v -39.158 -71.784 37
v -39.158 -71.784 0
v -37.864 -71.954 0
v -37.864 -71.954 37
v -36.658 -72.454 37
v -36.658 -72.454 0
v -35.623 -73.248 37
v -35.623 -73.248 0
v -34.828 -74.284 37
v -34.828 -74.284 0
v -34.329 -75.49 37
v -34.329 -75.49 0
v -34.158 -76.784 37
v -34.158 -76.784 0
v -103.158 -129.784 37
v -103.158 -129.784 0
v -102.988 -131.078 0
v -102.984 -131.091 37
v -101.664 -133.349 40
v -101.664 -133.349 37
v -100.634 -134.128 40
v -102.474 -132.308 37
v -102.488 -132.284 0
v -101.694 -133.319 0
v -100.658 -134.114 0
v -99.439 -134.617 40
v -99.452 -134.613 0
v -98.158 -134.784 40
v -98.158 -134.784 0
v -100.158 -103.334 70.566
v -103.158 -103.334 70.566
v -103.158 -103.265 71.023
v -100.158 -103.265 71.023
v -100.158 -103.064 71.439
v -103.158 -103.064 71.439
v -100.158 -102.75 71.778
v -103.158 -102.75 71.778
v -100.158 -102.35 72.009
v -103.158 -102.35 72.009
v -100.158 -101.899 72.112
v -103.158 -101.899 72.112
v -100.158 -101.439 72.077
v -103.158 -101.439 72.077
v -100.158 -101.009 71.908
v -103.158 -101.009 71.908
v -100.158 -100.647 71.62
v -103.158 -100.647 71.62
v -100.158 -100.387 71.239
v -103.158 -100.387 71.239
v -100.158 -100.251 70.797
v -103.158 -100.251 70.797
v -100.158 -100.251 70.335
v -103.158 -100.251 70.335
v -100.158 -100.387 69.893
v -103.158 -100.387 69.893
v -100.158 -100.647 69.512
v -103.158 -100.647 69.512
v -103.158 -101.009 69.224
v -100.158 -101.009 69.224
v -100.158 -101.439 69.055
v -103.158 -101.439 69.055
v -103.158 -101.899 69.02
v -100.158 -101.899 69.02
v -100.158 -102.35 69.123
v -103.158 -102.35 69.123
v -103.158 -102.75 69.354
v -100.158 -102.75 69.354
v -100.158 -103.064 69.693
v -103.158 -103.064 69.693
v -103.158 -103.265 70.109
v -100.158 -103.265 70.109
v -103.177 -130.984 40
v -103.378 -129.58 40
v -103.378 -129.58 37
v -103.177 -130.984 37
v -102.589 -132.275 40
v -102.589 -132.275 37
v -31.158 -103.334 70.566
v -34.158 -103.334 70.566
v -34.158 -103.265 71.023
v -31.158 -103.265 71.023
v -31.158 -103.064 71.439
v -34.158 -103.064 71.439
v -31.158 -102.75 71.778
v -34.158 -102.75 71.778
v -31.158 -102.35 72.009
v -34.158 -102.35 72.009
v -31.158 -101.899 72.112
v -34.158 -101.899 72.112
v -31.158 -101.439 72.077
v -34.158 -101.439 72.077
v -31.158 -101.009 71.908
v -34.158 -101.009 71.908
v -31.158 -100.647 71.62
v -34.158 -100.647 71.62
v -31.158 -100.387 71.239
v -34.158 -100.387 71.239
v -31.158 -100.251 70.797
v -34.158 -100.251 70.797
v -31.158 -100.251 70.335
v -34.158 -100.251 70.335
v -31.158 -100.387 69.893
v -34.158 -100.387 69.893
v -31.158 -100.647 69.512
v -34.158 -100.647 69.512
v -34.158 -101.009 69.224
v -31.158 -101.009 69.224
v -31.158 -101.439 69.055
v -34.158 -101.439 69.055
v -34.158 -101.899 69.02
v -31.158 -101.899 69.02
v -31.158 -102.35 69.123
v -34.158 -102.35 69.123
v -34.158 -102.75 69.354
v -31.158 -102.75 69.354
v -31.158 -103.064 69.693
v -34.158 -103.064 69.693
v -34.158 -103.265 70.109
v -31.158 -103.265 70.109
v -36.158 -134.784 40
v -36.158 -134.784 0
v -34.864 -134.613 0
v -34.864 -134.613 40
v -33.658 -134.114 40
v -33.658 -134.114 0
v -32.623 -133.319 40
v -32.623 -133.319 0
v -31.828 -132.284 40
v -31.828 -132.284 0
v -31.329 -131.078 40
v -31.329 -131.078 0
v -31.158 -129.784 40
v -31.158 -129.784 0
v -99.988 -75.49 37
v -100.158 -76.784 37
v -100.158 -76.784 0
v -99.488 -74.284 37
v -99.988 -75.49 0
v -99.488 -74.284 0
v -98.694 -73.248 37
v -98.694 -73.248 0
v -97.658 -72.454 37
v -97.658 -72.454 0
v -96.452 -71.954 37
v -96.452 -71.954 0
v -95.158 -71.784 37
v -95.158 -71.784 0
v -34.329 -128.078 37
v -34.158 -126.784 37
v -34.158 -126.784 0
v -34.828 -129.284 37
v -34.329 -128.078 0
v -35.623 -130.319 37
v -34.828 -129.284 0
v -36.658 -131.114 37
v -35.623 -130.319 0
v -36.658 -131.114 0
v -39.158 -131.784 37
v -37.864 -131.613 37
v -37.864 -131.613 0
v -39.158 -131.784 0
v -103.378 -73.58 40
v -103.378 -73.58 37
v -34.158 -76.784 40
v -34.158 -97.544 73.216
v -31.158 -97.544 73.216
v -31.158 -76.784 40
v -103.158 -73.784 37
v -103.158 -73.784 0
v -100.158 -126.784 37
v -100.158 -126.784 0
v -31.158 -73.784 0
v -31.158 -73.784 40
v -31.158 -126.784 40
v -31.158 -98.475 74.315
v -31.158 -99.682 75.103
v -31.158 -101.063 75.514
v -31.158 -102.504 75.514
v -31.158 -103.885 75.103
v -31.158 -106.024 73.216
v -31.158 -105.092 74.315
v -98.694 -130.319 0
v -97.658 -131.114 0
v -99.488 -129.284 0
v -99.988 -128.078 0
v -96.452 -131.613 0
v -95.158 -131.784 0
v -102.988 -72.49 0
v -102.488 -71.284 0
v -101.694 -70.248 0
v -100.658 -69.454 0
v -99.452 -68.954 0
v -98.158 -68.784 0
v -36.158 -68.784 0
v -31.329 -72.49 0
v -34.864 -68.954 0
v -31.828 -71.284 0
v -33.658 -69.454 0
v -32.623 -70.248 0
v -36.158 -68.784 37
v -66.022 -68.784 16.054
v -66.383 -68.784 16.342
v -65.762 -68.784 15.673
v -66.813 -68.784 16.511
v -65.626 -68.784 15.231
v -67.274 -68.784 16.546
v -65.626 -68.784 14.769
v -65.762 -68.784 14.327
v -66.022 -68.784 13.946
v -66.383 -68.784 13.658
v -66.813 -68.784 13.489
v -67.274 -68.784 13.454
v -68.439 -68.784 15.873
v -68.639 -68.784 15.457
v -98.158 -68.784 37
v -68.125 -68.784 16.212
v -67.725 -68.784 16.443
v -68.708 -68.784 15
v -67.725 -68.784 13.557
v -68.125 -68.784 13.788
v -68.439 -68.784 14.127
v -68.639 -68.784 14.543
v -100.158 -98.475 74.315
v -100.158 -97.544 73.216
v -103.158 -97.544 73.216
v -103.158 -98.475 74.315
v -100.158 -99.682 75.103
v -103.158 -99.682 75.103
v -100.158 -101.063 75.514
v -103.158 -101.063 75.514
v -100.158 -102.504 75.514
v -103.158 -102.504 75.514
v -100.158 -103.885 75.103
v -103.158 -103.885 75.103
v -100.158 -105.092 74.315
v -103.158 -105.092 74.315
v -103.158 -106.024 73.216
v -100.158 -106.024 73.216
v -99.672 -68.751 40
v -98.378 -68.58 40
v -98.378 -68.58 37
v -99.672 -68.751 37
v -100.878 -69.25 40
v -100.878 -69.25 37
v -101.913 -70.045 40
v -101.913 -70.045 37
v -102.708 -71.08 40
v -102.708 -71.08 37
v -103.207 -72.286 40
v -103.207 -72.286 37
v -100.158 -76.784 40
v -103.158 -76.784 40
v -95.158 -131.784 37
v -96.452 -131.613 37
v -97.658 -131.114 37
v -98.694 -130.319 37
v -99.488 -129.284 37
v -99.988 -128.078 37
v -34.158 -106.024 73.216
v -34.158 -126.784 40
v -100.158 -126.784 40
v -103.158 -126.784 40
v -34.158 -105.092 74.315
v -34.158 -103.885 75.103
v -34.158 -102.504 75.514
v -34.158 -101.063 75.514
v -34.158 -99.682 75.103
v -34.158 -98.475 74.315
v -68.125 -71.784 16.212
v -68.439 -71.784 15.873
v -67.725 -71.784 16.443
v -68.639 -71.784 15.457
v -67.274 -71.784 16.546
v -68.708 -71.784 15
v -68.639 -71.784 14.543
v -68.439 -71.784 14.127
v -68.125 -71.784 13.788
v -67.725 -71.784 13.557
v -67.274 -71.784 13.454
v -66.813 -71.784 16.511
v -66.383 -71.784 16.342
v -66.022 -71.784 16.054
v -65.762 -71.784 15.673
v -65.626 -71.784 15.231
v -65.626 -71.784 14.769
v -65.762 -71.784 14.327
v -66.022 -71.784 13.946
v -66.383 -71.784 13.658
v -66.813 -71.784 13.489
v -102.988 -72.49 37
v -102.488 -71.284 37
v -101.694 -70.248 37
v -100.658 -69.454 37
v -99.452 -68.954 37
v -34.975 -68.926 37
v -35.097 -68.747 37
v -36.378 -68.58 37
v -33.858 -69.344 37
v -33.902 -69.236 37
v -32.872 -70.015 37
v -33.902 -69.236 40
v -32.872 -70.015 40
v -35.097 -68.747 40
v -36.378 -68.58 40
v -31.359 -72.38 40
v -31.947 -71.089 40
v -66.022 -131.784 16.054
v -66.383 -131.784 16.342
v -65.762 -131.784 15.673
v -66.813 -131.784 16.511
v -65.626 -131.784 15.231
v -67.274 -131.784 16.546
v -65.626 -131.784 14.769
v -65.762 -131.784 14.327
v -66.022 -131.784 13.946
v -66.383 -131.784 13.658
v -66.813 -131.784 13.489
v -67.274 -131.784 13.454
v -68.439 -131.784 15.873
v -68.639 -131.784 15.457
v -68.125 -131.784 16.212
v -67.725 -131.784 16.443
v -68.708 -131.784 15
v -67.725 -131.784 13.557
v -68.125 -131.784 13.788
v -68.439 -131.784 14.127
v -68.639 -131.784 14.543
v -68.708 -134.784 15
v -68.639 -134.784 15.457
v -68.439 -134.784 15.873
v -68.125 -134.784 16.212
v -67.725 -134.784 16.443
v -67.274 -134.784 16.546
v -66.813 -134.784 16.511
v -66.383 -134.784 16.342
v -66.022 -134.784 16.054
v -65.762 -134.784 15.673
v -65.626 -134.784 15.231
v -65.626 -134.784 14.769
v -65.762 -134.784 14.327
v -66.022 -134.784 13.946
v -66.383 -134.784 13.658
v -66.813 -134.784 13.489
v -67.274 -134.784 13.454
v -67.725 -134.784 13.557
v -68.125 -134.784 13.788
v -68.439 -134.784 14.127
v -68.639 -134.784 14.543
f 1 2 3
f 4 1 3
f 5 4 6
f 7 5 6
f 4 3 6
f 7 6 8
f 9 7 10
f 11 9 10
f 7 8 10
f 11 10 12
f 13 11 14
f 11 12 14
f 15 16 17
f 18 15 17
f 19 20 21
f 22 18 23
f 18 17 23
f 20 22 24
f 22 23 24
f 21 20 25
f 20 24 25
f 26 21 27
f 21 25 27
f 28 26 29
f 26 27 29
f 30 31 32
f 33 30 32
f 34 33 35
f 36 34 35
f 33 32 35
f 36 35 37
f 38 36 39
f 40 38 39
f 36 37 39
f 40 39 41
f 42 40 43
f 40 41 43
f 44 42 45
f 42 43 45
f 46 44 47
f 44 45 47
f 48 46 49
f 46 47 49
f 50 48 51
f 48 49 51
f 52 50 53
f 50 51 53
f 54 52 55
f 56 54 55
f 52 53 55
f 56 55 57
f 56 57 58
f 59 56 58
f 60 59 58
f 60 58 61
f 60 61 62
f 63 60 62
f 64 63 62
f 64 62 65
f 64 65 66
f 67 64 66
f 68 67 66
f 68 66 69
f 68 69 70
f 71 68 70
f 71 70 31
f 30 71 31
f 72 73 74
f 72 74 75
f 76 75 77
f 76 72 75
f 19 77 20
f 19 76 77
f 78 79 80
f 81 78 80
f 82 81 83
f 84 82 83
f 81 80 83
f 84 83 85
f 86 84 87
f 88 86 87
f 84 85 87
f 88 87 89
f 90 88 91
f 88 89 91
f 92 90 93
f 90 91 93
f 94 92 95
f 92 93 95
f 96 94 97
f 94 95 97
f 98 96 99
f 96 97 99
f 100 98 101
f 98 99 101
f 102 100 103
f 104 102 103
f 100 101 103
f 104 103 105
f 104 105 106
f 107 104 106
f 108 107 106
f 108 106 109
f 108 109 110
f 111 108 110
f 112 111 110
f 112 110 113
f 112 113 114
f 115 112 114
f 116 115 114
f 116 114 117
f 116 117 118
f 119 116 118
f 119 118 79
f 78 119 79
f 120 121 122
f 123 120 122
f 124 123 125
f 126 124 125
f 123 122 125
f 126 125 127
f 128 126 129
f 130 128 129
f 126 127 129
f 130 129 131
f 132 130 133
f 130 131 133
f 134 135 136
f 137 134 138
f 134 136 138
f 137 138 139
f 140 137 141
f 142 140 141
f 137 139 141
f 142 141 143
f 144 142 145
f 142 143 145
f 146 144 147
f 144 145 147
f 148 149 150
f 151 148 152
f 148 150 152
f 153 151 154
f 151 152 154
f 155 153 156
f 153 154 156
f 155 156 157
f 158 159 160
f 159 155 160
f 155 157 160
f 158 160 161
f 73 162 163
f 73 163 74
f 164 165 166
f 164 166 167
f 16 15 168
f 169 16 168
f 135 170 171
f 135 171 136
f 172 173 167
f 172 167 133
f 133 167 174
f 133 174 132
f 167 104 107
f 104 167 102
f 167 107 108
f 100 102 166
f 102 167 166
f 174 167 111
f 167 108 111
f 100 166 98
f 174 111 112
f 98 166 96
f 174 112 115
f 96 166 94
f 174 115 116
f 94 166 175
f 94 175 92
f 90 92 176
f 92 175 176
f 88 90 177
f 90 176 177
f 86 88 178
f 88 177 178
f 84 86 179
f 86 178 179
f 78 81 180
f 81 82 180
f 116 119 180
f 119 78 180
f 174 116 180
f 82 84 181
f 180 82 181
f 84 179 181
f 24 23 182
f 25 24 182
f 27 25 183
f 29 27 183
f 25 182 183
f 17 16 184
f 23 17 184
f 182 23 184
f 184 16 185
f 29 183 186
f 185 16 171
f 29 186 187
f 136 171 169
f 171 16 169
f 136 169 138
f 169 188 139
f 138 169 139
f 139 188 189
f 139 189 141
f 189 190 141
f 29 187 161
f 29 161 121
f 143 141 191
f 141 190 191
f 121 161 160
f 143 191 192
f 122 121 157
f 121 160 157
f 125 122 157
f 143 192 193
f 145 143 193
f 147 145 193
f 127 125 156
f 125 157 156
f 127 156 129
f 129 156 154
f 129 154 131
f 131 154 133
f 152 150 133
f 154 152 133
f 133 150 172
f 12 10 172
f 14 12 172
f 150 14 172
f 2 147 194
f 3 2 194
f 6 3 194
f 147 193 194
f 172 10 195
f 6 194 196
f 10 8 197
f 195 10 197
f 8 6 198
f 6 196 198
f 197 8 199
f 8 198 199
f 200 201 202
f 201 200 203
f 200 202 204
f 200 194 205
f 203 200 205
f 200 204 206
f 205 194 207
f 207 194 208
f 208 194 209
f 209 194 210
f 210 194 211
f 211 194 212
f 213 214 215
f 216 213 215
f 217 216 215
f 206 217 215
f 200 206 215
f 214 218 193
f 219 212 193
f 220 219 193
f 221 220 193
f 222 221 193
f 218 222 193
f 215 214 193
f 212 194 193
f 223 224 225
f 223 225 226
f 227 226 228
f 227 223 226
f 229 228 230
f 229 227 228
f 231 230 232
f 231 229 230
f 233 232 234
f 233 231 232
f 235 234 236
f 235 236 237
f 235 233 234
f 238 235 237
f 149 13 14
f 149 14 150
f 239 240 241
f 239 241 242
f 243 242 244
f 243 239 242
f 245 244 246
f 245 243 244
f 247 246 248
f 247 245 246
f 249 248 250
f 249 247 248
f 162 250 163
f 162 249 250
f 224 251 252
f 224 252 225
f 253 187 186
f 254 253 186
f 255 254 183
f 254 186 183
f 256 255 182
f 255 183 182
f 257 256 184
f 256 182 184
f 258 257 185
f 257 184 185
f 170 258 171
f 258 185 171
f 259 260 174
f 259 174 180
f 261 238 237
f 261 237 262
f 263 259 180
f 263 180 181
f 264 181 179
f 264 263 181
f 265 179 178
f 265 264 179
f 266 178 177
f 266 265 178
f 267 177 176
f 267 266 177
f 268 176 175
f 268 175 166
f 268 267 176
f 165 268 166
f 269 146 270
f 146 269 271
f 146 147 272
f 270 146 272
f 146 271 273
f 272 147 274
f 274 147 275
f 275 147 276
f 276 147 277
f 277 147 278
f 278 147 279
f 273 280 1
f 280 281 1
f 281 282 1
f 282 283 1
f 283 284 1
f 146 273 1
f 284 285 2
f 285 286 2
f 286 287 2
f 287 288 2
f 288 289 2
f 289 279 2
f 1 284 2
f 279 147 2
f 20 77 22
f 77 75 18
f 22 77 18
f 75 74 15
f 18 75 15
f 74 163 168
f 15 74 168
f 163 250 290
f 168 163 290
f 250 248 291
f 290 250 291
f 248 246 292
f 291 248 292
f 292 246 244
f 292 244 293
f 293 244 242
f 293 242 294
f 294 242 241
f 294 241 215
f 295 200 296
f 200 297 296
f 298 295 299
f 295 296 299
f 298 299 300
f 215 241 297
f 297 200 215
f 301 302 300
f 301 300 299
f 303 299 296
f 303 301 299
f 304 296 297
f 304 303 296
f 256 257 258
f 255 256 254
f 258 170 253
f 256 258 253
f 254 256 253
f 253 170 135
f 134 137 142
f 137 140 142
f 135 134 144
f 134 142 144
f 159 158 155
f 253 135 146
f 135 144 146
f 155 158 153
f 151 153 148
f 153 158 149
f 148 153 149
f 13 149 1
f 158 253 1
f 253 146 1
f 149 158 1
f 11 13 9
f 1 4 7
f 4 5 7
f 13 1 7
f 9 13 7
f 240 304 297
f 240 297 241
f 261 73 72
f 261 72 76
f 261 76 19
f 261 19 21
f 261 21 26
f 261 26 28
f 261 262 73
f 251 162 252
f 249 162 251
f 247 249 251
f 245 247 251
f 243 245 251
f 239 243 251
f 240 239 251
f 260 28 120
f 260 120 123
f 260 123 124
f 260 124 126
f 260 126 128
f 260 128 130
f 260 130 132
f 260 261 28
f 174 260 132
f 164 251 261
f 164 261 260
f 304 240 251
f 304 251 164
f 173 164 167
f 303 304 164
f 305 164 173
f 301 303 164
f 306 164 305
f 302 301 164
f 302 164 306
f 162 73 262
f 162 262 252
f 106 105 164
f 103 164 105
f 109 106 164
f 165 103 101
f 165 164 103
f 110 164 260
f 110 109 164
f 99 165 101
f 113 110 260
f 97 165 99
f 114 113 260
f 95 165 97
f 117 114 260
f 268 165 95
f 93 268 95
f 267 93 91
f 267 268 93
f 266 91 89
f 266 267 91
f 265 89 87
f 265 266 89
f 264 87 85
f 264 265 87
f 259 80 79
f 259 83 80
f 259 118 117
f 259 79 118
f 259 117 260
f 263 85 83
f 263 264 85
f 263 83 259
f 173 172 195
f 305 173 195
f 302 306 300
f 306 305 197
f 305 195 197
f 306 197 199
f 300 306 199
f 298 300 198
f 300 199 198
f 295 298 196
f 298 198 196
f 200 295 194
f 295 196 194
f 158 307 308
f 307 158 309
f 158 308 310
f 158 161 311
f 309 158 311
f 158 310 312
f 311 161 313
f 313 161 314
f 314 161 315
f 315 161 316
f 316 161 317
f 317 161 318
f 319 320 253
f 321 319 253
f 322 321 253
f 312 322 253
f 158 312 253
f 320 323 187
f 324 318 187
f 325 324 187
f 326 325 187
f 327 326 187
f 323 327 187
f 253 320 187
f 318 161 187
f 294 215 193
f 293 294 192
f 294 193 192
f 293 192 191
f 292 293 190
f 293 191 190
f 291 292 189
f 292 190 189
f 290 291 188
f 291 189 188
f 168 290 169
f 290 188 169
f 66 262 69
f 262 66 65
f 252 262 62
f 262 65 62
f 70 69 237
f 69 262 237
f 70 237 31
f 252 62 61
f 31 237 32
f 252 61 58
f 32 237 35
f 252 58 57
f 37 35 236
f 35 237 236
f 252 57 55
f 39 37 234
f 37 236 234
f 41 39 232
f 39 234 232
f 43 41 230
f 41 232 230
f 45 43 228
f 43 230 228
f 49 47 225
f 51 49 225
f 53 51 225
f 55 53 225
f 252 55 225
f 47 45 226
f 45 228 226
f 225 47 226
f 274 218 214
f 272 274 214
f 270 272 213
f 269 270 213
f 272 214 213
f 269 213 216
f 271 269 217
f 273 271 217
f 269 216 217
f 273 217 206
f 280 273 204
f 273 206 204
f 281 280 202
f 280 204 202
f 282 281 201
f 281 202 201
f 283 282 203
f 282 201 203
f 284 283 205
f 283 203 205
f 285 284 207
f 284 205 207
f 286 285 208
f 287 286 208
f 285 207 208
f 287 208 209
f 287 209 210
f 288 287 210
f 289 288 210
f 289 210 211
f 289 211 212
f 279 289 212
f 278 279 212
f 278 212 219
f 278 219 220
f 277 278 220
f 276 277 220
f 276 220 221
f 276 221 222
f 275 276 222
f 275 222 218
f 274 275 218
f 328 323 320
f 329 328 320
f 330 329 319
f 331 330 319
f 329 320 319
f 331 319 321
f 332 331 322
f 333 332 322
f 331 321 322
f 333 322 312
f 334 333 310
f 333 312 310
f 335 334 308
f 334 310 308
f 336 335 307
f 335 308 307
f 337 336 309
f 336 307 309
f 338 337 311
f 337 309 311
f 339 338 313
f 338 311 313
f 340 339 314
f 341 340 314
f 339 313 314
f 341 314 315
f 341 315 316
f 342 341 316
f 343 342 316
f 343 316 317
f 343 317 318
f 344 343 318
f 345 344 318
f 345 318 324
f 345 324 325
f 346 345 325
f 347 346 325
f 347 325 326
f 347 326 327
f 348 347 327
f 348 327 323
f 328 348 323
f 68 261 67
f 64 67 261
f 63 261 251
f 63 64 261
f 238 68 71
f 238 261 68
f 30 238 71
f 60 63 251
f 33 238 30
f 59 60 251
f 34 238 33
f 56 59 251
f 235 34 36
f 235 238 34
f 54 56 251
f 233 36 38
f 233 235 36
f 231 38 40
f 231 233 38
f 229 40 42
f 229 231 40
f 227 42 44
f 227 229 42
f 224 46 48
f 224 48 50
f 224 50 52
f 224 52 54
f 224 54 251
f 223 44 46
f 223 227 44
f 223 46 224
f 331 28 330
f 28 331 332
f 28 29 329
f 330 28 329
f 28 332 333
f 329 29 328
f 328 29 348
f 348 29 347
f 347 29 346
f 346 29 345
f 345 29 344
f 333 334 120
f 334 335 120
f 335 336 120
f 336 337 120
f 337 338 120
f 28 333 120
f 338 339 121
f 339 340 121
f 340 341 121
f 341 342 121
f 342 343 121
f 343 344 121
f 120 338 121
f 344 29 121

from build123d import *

# Parameters (mm, degrees)
F1_DEPTH = 40
F3_DEPTH = 3
F5_DEPTH = 3
F7_DEPTH = 3
F9_D     = 3.1
F11_D    = 3.1


with BuildPart() as f1:
    # F0 (on Top) → F1 (new body)
    with BuildSketch(Plane.XY):
        with BuildLine():
            ThreePointArc((-98.1582802534, -68.7836479545), (-101.6938141593, -70.2481140485), (-103.1582802534, -73.7836479545))
            Line((-103.1582802534, -73.7836479545), (-103.1582802534, -129.7836479545))
            ThreePointArc((-103.1582802534, -129.7836479545), (-101.6938141593, -133.3191818604), (-98.1582802534, -134.7836479545))
            Line((-98.1582802534, -134.7836479545), (-36.1582802534, -134.7836479545))
            ThreePointArc((-36.1582802534, -134.7836479545), (-32.6227463475, -133.3191818604), (-31.1582802534, -129.7836479545))
            Line((-31.1582802534, -129.7836479545), (-31.1582802534, -73.7836479545))
            ThreePointArc((-31.1582802534, -73.7836479545), (-32.6227463475, -70.2481140485), (-36.1582802534, -68.7836479545))
            Line((-36.1582802534, -68.7836479545), (-98.1582802534, -68.7836479545))
        make_face()
        with BuildLine():
            ThreePointArc((-100.1582802534, -76.7836479545), (-98.6938141593, -73.2481140485), (-95.1582802534, -71.7836479545))
            Line((-95.1582802534, -71.7836479545), (-39.1582802534, -71.7836479545))
            ThreePointArc((-39.1582802534, -71.7836479545), (-35.6227463475, -73.2481140485), (-34.1582802534, -76.7836479545))
            Line((-34.1582802534, -76.7836479545), (-34.1582802534, -126.7836479545))
            ThreePointArc((-34.1582802534, -126.7836479545), (-35.6227463475, -130.3191818604), (-39.1582802534, -131.7836479545))
            Line((-39.1582802534, -131.7836479545), (-95.1582802534, -131.7836479545))
            ThreePointArc((-95.1582802534, -131.7836479545), (-98.6938141593, -130.3191818604), (-100.1582802534, -126.7836479545))
            Line((-100.1582802534, -126.7836479545), (-100.1582802534, -76.7836479545))
        make_face(mode=Mode.SUBTRACT)
    extrude(amount=F1_DEPTH)

    # F2 (on face) → F3 (join)
    with BuildSketch(Plane.YZ.offset(-100.1582802534)):
        with BuildLine():
            Line((-106.0236394745, 73.216013568), (-126.7836479545, 40))
            Line((-126.7836479545, 40), (-76.7836479545, 40))
            Line((-76.7836479545, 40), (-97.5436564344, 73.216013568))
            ThreePointArc((-97.5436564344, 73.216013568), (-101.7836479545, 75.5660188679), (-106.0236394745, 73.216013568))
        make_face()
    extrude(amount=-F3_DEPTH)

    # F4 (on face) → F5 (join)
    with BuildSketch(Plane(origin=(-34.1582802534, 0, 0), x_dir=(0, -1, 0), z_dir=(-1, 0, 0))):
        with BuildLine():
            Line((97.5436564344, 73.216013568), (76.7836479545, 40))
            Line((76.7836479545, 40), (80.8389559388, 40))
            Line((80.8389559388, 40), (126.7836479545, 40))
            Line((126.7836479545, 40), (106.0236394745, 73.216013568))
            ThreePointArc((106.0236394745, 73.216013568), (101.7836479545, 75.5660188679), (97.5436564344, 73.216013568))
        make_face()
    extrude(amount=-F5_DEPTH)

    # F6 (on face) → F7 (join)
    with BuildSketch(Plane.XY.offset(40)):
        with BuildLine():
            Line((-36.3776951637, -68.5804857016), (-98.3776951637, -68.5804857016))
            ThreePointArc((-98.3776951637, -68.5804857016), (-101.9132290697, -70.0449517956), (-103.3776951637, -73.5804857016))
            Line((-103.3776951637, -73.5804857016), (-103.3776951637, -129.5804857016))
            ThreePointArc((-103.3776951637, -129.5804857016), (-102.9290181233, -131.6506207979), (-101.6635114368, -133.349227059))
            ThreePointArc((-101.6635114368, -133.349227059), (-102.7694707676, -131.716759964), (-103.1582802534, -129.7836479545))
            Line((-103.1582802534, -129.7836479545), (-103.1582802534, -126.7836479545))
            Line((-103.1582802534, -126.7836479545), (-100.1582802534, -126.7836479545))
            ThreePointArc((-100.1582802534, -126.7836479545), (-98.6938141593, -130.3191818604), (-95.1582802534, -131.7836479545))
            Line((-95.1582802534, -131.7836479545), (-39.1582802534, -131.7836479545))
            ThreePointArc((-39.1582802534, -131.7836479545), (-35.6227463475, -130.3191818604), (-34.1582802534, -126.7836479545))
            Line((-34.1582802534, -126.7836479545), (-31.3776951637, -126.7836479545))
            Line((-31.3776951637, -126.7836479545), (-31.3776951637, -73.5804857016))
            ThreePointArc((-31.3776951637, -73.5804857016), (-32.8421612578, -70.0449517956), (-36.3776951637, -68.5804857016))
        make_face()
    extrude(amount=-F7_DEPTH)

    # F9 (through all)
    with Locations(Plane.YZ.offset(-31.1582802534)):
        with Locations((-101.7836479545, 70.5660188679)):
            Hole(F9_D / 2)

    # F11 (through all)
    with Locations(Plane.XZ.offset(134.7836479545)):
        with Locations((-67.1582802534, 15)):
            Hole(F11_D / 2)


solid = f1.part
